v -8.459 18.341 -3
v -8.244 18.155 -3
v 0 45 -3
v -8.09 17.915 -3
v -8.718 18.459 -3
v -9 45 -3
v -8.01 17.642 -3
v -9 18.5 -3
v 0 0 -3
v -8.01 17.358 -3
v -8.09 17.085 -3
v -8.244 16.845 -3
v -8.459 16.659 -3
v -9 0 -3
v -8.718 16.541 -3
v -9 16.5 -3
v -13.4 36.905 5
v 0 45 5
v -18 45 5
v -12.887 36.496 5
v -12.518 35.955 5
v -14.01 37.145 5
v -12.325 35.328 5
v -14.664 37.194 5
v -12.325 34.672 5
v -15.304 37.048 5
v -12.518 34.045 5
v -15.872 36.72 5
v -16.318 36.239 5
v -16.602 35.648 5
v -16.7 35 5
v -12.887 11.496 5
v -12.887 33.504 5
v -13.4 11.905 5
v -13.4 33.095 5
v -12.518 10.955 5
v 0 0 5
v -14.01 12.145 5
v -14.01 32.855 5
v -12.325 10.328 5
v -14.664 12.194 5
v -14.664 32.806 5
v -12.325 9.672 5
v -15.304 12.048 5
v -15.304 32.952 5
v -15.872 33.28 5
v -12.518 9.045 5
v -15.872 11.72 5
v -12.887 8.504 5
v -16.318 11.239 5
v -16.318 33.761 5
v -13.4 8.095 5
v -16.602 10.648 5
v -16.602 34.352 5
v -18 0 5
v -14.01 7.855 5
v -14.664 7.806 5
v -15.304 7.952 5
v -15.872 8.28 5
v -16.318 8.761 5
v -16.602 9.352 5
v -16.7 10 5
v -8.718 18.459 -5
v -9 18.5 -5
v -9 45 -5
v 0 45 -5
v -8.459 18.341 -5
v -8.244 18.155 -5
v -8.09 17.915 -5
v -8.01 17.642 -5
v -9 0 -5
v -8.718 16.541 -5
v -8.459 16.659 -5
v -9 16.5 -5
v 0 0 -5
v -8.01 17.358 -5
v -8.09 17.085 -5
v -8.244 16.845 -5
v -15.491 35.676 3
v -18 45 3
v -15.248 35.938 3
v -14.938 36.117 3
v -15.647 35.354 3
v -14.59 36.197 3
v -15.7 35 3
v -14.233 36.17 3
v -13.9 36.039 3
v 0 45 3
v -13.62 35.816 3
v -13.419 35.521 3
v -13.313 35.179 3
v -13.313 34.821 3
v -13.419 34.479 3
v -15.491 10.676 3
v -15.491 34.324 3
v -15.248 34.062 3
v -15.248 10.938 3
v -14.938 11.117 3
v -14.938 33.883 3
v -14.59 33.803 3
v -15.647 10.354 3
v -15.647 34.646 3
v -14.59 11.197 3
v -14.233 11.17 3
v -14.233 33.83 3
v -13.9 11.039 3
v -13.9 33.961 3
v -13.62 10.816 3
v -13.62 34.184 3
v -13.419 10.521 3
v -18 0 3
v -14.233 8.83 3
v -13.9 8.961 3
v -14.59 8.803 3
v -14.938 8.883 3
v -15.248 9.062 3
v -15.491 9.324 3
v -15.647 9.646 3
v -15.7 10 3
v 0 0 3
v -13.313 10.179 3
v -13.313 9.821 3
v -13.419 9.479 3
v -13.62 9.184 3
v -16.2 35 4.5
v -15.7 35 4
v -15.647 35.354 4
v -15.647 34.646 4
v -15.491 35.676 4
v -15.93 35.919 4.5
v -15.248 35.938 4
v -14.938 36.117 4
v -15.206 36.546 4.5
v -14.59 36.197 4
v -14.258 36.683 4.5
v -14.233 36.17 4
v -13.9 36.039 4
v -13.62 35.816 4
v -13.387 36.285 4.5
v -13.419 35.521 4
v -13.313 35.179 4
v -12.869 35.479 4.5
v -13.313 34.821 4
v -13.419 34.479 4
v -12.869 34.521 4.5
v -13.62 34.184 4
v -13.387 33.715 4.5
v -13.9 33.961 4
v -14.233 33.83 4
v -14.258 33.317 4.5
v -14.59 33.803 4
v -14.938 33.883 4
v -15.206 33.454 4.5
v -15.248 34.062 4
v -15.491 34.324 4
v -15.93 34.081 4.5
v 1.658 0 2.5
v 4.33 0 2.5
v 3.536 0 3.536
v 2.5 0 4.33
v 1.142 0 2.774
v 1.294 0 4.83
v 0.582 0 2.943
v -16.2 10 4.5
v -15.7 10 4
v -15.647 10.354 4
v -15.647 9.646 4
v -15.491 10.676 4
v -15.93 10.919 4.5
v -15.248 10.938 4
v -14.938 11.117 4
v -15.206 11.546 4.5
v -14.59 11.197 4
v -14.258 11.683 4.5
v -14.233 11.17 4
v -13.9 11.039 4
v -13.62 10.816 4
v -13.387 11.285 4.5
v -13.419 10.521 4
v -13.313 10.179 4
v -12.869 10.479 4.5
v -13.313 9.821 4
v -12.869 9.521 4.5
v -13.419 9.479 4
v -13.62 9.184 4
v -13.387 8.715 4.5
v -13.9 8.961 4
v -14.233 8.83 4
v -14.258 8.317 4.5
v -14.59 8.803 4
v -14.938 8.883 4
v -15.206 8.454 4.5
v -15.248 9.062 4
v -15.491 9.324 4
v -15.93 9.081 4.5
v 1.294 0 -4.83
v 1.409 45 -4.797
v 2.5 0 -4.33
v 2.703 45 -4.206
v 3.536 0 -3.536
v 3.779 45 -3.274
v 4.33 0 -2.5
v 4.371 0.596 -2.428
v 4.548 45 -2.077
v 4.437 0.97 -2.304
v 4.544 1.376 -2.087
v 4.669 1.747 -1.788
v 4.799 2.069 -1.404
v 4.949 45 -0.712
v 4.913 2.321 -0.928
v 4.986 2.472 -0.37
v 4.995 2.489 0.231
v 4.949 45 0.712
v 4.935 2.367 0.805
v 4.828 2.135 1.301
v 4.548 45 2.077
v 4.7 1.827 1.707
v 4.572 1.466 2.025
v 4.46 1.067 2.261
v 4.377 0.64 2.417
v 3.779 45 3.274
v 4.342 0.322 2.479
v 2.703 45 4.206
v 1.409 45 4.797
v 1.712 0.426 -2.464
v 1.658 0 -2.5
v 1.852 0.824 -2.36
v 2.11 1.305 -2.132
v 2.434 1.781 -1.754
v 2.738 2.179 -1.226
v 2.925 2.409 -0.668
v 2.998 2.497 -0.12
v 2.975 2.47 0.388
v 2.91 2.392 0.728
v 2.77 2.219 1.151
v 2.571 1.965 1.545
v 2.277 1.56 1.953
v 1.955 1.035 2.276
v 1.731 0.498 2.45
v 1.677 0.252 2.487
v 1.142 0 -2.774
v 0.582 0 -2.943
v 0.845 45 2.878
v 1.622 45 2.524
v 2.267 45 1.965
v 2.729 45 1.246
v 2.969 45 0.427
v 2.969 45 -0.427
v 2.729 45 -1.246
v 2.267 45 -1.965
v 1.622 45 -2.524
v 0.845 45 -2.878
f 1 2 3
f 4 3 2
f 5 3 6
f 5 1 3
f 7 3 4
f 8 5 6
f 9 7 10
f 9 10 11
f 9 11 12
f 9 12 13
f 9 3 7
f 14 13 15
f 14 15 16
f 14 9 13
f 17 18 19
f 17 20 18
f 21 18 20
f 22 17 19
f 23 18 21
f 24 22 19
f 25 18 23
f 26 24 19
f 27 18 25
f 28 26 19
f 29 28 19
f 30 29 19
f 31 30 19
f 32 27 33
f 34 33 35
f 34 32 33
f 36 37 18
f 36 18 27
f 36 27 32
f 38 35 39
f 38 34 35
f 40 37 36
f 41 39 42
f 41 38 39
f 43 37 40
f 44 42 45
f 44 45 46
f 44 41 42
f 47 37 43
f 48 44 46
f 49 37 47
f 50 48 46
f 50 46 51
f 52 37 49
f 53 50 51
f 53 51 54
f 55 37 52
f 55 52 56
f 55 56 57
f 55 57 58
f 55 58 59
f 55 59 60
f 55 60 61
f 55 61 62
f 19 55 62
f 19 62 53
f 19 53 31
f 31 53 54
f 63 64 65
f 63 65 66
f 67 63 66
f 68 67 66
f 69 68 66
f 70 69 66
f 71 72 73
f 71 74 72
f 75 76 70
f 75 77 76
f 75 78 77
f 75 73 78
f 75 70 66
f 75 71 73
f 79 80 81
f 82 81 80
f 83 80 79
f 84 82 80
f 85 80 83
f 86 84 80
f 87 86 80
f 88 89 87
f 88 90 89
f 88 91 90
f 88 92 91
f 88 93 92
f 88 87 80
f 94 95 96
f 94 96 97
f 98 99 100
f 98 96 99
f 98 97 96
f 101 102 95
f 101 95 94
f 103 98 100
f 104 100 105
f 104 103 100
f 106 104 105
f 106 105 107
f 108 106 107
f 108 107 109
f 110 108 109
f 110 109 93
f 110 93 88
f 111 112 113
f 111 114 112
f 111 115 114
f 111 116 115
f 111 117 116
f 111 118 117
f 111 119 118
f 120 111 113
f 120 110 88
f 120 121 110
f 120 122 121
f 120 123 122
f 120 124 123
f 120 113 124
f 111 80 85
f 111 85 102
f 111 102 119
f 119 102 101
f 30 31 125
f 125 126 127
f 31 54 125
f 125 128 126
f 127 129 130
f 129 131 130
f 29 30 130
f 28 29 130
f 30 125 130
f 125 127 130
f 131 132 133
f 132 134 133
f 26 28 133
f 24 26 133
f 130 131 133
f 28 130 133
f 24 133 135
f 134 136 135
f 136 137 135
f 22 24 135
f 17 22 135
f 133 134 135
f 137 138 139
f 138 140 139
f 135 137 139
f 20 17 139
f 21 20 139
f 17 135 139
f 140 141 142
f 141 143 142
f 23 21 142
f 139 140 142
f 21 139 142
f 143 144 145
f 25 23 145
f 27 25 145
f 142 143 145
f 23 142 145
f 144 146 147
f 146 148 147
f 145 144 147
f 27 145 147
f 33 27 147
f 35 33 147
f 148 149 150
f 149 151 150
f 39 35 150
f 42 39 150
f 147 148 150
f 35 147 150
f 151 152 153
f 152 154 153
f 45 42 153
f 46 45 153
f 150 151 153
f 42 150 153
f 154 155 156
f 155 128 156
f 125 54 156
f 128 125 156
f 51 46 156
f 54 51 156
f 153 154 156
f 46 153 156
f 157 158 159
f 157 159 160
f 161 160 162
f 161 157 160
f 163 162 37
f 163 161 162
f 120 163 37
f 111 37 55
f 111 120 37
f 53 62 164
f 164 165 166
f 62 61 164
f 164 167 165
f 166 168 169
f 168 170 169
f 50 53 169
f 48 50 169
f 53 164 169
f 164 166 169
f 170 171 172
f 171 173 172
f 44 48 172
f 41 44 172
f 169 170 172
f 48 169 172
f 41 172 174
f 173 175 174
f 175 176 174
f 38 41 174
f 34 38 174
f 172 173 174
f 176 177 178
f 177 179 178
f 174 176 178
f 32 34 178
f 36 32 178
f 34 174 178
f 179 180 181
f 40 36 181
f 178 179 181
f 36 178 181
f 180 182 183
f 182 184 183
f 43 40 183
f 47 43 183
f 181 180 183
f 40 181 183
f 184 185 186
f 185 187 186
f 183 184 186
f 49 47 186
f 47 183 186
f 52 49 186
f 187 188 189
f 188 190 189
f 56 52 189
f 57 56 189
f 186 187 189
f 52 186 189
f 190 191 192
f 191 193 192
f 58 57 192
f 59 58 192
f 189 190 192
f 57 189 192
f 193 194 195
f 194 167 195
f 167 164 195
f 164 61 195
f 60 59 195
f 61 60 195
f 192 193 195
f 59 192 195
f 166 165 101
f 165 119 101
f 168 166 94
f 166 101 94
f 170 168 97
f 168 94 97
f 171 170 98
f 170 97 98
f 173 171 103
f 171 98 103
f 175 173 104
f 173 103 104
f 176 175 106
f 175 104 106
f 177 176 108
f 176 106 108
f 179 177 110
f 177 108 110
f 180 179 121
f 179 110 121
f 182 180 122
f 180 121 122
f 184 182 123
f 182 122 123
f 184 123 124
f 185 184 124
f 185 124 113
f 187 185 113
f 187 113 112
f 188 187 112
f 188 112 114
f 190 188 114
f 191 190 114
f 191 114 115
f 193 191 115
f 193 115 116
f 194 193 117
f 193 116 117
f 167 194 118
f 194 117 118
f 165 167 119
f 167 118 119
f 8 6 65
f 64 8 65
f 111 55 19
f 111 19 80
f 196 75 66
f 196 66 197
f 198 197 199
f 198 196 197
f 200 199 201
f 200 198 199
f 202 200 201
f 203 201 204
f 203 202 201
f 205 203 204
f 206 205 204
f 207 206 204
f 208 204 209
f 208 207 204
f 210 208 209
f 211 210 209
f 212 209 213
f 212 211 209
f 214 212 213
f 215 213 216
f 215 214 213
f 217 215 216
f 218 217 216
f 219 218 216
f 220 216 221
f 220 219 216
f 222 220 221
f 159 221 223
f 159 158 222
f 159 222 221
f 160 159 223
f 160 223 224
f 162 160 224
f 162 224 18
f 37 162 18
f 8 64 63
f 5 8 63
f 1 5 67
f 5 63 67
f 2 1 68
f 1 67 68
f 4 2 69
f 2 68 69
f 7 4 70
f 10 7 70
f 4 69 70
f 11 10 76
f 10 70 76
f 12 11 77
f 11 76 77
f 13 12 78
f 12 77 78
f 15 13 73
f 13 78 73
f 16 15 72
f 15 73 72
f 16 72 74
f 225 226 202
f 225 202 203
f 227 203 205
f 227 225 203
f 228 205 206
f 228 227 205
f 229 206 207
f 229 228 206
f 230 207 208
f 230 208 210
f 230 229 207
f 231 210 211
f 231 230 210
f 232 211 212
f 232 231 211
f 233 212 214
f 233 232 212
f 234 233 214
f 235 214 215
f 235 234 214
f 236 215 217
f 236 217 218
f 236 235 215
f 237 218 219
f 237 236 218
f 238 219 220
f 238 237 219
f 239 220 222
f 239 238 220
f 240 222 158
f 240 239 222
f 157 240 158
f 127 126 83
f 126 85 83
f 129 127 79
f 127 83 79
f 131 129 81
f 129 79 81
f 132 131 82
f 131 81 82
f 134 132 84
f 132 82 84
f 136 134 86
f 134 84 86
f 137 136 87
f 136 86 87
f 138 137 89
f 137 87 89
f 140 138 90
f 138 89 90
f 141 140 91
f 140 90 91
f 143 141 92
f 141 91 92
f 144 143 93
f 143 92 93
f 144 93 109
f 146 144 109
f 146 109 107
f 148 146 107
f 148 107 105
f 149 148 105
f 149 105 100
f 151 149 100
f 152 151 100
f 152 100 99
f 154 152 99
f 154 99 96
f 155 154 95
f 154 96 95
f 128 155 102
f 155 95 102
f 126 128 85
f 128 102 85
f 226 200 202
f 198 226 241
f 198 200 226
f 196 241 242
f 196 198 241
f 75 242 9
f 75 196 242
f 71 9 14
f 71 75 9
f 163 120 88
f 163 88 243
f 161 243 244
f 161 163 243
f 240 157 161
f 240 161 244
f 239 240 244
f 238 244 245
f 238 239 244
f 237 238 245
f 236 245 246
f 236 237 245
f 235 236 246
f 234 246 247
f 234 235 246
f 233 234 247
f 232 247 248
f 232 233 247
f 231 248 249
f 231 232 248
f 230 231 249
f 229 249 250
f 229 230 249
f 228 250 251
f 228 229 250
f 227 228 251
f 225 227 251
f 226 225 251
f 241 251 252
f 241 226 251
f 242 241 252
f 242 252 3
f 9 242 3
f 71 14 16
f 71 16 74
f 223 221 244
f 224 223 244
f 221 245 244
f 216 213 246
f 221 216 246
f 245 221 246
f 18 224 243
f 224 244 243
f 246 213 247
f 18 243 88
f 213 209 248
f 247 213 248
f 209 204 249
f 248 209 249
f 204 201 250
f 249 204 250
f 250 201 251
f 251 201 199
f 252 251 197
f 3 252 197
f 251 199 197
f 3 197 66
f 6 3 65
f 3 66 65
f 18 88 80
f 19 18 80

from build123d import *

# Parameters (mm, degrees)
BOSS_EXTRUDE1_DEPTH                                 = 45
SKETCH2_R                                           = 1
CUT_EXTRUDE1_DEPTH                                  = 5
SKETCH3_R                                           = 2.5
CUT_EXTRUDE2_DEPTH                                  = 6
CSK_FOR_M2_COUNTERSUNK_FLAT_HEAD_SCREW1_D           = 2.4
CSK_FOR_M2_COUNTERSUNK_FLAT_HEAD_SCREW1_CSINK_D     = 4.4
CSK_FOR_M2_COUNTERSUNK_FLAT_HEAD_SCREW1_CSINK_ANGLE = 90


with BuildPart() as part:
    # Sketch1 → Boss-Extrude1 (new body)
    with BuildSketch(Plane(origin=(0, 0, 0), x_dir=(1, 0, 0), z_dir=(0, 1, 0))):
        with BuildLine():
            Line((0, 3), (-9, 3))
            Line((-9, 3), (-9, 5))
            Line((-9, 5), (0, 5))
            ThreePointArc((0, 5), (5, 0), (0, -5))
            Line((0, -5), (-18, -5))
            Line((-18, -5), (-18, -3))
            Line((-18, -3), (0, -3))
            ThreePointArc((0, -3), (3, 0), (0, 3))
        make_face()
    extrude(amount=BOSS_EXTRUDE1_DEPTH)

    # Sketch2 → Cut-Extrude1 (cut)
    with BuildSketch(Plane(origin=(0, 0, -5), x_dir=(-1, 0, 0), z_dir=(0, 0, -1))):
        with Locations((9, 17.5)):
            Circle(SKETCH2_R)
    extrude(amount=-CUT_EXTRUDE1_DEPTH, mode=Mode.SUBTRACT)

    # Sketch3 → Cut-Extrude2 (cut)
    with BuildSketch(Plane(origin=(0, 0, 0), x_dir=(0, 0, -1), z_dir=(1, 0, 0))):
        Circle(SKETCH3_R)
    extrude(amount=CUT_EXTRUDE2_DEPTH, mode=Mode.SUBTRACT)

    # CSK for M2 Countersunk Flat Head Screw1 (through all)
    with Locations(Plane(origin=(-14.5, 35, 5), x_dir=(1, 0, 0), z_dir=(0, 0, 1))):
        with Locations((0, 0), (0, -25)):
            CounterSinkHole(CSK_FOR_M2_COUNTERSUNK_FLAT_HEAD_SCREW1_D / 2, CSK_FOR_M2_COUNTERSUNK_FLAT_HEAD_SCREW1_CSINK_D / 2, counter_sink_angle=CSK_FOR_M2_COUNTERSUNK_FLAT_HEAD_SCREW1_CSINK_ANGLE)


solid = part.part
